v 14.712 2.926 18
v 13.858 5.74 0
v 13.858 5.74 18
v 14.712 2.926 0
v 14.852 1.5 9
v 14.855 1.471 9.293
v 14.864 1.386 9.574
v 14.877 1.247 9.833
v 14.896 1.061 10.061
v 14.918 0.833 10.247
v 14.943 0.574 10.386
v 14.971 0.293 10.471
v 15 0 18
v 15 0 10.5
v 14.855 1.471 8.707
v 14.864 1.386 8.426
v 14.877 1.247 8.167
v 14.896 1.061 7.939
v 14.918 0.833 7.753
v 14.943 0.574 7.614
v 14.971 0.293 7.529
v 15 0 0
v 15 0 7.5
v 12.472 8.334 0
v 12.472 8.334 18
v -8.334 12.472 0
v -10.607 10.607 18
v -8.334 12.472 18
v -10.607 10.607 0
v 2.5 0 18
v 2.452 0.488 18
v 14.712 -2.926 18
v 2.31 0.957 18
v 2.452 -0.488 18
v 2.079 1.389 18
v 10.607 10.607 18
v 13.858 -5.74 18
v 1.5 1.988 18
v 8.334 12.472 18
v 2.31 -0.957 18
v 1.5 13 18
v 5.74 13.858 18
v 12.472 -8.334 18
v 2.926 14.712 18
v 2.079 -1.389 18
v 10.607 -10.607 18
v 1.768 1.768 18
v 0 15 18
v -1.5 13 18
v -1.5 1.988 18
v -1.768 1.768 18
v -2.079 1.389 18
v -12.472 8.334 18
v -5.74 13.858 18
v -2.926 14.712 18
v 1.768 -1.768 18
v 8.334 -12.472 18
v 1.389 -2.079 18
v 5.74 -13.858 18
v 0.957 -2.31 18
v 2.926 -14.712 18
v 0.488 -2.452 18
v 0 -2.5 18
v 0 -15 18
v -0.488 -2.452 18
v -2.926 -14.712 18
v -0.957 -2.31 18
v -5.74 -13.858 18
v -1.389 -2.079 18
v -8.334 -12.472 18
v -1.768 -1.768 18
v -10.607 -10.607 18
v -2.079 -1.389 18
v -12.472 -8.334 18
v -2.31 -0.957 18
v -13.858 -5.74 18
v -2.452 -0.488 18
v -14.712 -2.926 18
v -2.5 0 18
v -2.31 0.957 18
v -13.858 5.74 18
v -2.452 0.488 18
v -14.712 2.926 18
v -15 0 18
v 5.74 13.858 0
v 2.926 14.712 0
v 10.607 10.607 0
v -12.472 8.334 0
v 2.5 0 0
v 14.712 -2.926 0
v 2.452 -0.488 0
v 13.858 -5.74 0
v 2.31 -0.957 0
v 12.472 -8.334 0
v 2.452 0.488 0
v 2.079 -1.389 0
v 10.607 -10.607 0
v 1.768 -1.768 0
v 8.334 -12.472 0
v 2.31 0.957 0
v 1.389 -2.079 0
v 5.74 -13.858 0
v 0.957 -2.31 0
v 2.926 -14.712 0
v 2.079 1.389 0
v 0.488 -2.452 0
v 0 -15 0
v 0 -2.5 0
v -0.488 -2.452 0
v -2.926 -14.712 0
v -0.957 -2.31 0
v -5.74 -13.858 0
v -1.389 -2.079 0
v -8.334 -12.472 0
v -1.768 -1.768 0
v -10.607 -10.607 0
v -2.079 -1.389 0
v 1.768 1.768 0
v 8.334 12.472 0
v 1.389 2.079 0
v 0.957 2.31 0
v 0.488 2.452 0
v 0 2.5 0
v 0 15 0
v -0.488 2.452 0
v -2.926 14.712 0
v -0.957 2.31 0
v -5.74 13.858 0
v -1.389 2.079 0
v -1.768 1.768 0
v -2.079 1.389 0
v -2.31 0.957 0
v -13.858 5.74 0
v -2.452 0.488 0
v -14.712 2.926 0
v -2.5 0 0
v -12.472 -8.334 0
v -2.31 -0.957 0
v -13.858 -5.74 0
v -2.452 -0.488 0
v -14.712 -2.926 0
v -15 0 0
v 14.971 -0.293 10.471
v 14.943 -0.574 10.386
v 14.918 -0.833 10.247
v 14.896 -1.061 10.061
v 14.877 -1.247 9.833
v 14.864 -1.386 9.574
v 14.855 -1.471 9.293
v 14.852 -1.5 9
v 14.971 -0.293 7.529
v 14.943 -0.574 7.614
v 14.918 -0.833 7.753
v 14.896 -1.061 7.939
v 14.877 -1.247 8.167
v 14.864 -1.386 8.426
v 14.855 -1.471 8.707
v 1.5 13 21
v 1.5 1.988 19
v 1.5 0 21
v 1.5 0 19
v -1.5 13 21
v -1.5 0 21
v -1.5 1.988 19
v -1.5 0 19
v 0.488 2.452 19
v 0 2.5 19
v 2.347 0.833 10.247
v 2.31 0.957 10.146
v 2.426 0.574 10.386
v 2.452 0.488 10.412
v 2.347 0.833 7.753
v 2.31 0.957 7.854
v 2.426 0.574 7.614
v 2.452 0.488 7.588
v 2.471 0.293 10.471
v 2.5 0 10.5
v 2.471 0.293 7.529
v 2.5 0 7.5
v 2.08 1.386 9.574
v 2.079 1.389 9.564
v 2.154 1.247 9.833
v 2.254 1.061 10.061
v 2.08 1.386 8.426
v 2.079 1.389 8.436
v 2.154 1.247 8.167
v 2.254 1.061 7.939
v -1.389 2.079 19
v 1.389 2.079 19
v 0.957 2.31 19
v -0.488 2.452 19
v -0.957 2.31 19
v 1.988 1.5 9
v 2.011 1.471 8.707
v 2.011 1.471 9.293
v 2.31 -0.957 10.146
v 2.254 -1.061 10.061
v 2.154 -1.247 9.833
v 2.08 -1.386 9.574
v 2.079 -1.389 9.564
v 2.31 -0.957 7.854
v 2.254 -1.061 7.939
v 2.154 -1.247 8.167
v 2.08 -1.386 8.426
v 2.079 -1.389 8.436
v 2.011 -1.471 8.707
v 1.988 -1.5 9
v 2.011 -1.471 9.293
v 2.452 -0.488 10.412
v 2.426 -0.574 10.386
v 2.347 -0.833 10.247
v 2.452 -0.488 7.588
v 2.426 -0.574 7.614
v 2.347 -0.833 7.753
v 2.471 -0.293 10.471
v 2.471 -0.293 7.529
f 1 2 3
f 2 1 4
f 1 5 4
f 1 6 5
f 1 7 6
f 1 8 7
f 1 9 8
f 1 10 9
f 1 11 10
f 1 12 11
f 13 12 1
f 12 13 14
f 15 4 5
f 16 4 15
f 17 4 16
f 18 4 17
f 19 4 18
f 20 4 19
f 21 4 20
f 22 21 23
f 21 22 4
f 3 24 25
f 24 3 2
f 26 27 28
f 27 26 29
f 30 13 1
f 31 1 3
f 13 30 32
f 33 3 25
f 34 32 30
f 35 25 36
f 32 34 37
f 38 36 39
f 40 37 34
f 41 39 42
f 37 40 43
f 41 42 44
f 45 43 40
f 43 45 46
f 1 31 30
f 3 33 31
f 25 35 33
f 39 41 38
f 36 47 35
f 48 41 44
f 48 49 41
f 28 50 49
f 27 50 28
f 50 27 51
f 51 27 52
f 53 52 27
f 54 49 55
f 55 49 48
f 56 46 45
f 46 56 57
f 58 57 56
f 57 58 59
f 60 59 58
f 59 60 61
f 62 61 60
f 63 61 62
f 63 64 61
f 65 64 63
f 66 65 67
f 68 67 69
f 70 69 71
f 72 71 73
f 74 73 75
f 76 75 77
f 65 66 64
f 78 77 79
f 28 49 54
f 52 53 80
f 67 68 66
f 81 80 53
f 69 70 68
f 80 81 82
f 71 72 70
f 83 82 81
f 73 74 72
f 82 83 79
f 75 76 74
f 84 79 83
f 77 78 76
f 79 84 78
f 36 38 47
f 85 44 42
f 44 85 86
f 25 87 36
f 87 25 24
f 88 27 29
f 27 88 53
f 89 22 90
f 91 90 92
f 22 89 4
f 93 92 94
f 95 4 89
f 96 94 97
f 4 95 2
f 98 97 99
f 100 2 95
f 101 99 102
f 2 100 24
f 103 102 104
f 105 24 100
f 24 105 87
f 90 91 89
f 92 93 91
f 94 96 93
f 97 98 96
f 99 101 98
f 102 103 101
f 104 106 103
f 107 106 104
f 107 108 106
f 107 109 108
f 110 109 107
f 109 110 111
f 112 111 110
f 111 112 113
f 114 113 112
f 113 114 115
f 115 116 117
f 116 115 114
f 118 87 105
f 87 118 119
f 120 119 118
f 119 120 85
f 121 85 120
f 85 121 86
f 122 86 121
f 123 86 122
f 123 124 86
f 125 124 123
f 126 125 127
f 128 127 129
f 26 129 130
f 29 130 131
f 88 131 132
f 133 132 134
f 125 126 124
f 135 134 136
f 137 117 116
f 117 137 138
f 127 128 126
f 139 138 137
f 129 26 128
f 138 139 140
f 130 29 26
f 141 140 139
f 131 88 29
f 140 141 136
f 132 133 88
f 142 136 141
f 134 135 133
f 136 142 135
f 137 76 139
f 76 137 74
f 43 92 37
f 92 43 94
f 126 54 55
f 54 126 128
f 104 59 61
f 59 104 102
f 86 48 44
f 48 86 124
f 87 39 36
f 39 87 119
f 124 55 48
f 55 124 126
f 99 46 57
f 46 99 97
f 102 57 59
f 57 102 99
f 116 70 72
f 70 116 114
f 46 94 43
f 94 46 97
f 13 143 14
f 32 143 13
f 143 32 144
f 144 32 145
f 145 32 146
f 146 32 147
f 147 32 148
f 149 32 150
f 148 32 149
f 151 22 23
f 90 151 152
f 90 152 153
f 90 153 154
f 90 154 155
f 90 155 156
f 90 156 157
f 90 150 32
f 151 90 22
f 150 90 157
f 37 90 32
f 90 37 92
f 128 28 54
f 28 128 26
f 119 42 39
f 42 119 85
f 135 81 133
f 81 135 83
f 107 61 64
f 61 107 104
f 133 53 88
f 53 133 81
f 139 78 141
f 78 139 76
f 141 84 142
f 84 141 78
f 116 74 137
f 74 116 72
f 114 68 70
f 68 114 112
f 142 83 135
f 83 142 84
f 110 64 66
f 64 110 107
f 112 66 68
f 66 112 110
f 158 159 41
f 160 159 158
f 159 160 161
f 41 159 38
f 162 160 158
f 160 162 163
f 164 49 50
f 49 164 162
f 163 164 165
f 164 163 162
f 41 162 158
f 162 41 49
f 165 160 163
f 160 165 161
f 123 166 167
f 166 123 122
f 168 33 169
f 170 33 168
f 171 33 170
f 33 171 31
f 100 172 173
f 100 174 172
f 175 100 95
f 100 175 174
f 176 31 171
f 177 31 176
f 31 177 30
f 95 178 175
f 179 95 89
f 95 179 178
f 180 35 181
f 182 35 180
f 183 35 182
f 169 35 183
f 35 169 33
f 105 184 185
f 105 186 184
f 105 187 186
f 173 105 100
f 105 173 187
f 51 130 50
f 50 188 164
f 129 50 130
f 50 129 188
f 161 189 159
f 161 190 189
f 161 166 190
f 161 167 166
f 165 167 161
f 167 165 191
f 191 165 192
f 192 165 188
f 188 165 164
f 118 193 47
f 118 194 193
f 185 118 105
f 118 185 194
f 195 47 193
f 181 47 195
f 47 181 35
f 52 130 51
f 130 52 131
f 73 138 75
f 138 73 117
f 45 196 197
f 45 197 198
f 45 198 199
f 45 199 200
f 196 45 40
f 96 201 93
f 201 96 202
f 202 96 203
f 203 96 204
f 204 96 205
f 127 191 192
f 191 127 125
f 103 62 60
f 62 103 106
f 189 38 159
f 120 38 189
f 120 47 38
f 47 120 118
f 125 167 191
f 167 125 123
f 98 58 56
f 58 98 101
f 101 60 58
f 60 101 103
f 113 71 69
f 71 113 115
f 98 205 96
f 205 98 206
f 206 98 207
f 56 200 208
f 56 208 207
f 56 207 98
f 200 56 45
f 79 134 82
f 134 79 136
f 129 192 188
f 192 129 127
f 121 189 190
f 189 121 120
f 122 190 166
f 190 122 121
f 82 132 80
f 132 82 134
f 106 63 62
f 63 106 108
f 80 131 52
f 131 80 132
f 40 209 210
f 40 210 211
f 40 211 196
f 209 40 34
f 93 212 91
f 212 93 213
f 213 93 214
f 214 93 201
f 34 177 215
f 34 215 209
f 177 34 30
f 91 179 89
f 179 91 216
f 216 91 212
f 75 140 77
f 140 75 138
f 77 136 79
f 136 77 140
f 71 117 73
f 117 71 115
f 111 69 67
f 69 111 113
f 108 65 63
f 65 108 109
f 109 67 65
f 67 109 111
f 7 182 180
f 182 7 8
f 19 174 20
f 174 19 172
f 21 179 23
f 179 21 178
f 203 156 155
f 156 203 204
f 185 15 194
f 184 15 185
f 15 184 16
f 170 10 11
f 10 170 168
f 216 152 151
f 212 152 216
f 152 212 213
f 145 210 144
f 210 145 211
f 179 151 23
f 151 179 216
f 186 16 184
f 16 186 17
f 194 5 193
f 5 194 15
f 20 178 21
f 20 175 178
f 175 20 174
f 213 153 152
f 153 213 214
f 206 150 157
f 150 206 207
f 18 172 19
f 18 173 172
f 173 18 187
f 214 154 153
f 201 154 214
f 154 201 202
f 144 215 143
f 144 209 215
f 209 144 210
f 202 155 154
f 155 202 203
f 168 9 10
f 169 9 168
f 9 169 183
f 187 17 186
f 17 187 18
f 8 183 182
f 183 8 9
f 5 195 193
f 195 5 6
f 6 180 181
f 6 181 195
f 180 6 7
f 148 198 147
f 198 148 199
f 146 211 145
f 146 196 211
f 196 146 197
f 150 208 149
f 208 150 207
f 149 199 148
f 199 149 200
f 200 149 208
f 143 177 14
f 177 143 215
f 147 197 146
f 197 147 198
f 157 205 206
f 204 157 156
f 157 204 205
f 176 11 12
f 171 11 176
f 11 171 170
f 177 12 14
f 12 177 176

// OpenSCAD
$fn = 32;

// ----------------------------------------------------------------------
// Control knob: pointer knob
// ----------------------------------------------------------------------

// --- parameters (mm) ---
rib_w = 3;                // pointer rib width
rib_h = 4;                // pointer rib height
knob_d = 30;              // knob body diameter
knob_h = 18;              // knob body height
bore_d = 5;               // shaft bore diameter
set_d = 3;                // set screw bore diameter

rib_poke = rib_h - 1;  // rib height above the top
total_h = knob_h + rib_h - 1;  // overall height

difference() {
  union() {
    cylinder(h = knob_h, d = knob_d);
    translate([-rib_w / 2, 0, knob_h - 1])
      cube([rib_w, knob_d / 2 - 2, rib_h]);
  }
  translate([0, 0, -1]) cylinder(h = knob_h + 2, d = bore_d);
  translate([-1, 0, knob_h / 2]) rotate([0, 90, 0])
    cylinder(h = knob_d / 2 + bore_d / 2 + 2, d = set_d);}
